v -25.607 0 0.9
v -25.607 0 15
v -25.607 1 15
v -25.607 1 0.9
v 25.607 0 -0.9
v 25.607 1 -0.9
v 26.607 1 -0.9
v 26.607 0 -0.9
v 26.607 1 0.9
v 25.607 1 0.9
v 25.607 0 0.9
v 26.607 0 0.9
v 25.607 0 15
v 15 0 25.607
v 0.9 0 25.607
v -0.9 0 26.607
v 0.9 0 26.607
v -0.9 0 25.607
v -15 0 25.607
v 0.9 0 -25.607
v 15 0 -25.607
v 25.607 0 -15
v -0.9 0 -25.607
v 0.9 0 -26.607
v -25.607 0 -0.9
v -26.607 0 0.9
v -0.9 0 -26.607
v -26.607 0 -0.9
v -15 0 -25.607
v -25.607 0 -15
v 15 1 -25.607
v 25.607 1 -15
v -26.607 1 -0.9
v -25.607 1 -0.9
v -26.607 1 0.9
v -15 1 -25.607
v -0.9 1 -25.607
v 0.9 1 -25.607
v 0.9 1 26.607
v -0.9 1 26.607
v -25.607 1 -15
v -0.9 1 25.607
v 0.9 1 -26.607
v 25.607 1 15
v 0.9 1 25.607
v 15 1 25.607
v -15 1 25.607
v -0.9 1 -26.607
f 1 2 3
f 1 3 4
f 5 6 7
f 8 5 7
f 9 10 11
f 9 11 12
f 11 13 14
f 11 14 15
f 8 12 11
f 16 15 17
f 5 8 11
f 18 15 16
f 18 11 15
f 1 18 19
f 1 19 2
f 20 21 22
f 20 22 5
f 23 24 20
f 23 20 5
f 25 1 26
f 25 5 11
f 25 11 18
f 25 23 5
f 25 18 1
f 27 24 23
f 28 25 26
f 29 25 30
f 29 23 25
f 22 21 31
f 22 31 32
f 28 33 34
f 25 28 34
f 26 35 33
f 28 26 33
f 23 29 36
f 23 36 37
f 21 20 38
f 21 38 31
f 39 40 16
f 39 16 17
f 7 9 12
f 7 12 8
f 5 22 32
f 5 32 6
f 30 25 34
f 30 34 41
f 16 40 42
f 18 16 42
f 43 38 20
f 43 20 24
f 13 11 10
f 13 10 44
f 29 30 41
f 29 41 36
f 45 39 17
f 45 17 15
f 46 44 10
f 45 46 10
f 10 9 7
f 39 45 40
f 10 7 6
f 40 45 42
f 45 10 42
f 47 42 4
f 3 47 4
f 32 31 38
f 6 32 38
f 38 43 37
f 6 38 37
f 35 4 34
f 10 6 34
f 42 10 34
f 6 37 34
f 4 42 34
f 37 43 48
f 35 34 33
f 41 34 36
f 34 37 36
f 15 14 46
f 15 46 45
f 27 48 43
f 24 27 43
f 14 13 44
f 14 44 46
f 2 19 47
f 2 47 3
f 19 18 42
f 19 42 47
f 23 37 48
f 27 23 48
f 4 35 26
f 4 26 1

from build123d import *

# Parameters (mm, degrees)
BOSS_EXTRUDE1_DEPTH = 1
SKETCH2_W           = 1
SKETCH2_H           = 1.8
SKETCH2_W_2         = 1.8
SKETCH2_H_2         = 1
BOSS_EXTRUDE2_DEPTH = 1


with BuildPart() as part:
    # Sketch1 → Boss-Extrude1 (new body)
    with BuildSketch(Plane(origin=(0, 0, 0), x_dir=(1, 0, 0), z_dir=(0, 1, 0))):
        Polygon((-25.606601718, 15), (-15, 25.606601718), (15, 25.606601718), (25.606601718, 15), (25.606601718, -15), (15, -25.606601718), (-15, -25.606601718), (-25.606601718, -15), align=None)
    extrude(amount=BOSS_EXTRUDE1_DEPTH)

    # Sketch2 → Boss-Extrude2 (add)
    with BuildSketch(Plane(origin=(0, 1, 0), x_dir=(1, 0, 0), z_dir=(0, 1, 0))):
        with Locations((-26.106601718, 0)):
            Rectangle(SKETCH2_W, SKETCH2_H)
        with Locations((0, 26.106601718)):
            Rectangle(SKETCH2_W_2, SKETCH2_H_2)
        with Locations((0, -26.106601718)):
            Rectangle(SKETCH2_W_2, SKETCH2_H_2)
        with Locations((26.106601718, 0)):
            Rectangle(SKETCH2_W, SKETCH2_H)
    extrude(amount=-BOSS_EXTRUDE2_DEPTH)


solid = part.part
